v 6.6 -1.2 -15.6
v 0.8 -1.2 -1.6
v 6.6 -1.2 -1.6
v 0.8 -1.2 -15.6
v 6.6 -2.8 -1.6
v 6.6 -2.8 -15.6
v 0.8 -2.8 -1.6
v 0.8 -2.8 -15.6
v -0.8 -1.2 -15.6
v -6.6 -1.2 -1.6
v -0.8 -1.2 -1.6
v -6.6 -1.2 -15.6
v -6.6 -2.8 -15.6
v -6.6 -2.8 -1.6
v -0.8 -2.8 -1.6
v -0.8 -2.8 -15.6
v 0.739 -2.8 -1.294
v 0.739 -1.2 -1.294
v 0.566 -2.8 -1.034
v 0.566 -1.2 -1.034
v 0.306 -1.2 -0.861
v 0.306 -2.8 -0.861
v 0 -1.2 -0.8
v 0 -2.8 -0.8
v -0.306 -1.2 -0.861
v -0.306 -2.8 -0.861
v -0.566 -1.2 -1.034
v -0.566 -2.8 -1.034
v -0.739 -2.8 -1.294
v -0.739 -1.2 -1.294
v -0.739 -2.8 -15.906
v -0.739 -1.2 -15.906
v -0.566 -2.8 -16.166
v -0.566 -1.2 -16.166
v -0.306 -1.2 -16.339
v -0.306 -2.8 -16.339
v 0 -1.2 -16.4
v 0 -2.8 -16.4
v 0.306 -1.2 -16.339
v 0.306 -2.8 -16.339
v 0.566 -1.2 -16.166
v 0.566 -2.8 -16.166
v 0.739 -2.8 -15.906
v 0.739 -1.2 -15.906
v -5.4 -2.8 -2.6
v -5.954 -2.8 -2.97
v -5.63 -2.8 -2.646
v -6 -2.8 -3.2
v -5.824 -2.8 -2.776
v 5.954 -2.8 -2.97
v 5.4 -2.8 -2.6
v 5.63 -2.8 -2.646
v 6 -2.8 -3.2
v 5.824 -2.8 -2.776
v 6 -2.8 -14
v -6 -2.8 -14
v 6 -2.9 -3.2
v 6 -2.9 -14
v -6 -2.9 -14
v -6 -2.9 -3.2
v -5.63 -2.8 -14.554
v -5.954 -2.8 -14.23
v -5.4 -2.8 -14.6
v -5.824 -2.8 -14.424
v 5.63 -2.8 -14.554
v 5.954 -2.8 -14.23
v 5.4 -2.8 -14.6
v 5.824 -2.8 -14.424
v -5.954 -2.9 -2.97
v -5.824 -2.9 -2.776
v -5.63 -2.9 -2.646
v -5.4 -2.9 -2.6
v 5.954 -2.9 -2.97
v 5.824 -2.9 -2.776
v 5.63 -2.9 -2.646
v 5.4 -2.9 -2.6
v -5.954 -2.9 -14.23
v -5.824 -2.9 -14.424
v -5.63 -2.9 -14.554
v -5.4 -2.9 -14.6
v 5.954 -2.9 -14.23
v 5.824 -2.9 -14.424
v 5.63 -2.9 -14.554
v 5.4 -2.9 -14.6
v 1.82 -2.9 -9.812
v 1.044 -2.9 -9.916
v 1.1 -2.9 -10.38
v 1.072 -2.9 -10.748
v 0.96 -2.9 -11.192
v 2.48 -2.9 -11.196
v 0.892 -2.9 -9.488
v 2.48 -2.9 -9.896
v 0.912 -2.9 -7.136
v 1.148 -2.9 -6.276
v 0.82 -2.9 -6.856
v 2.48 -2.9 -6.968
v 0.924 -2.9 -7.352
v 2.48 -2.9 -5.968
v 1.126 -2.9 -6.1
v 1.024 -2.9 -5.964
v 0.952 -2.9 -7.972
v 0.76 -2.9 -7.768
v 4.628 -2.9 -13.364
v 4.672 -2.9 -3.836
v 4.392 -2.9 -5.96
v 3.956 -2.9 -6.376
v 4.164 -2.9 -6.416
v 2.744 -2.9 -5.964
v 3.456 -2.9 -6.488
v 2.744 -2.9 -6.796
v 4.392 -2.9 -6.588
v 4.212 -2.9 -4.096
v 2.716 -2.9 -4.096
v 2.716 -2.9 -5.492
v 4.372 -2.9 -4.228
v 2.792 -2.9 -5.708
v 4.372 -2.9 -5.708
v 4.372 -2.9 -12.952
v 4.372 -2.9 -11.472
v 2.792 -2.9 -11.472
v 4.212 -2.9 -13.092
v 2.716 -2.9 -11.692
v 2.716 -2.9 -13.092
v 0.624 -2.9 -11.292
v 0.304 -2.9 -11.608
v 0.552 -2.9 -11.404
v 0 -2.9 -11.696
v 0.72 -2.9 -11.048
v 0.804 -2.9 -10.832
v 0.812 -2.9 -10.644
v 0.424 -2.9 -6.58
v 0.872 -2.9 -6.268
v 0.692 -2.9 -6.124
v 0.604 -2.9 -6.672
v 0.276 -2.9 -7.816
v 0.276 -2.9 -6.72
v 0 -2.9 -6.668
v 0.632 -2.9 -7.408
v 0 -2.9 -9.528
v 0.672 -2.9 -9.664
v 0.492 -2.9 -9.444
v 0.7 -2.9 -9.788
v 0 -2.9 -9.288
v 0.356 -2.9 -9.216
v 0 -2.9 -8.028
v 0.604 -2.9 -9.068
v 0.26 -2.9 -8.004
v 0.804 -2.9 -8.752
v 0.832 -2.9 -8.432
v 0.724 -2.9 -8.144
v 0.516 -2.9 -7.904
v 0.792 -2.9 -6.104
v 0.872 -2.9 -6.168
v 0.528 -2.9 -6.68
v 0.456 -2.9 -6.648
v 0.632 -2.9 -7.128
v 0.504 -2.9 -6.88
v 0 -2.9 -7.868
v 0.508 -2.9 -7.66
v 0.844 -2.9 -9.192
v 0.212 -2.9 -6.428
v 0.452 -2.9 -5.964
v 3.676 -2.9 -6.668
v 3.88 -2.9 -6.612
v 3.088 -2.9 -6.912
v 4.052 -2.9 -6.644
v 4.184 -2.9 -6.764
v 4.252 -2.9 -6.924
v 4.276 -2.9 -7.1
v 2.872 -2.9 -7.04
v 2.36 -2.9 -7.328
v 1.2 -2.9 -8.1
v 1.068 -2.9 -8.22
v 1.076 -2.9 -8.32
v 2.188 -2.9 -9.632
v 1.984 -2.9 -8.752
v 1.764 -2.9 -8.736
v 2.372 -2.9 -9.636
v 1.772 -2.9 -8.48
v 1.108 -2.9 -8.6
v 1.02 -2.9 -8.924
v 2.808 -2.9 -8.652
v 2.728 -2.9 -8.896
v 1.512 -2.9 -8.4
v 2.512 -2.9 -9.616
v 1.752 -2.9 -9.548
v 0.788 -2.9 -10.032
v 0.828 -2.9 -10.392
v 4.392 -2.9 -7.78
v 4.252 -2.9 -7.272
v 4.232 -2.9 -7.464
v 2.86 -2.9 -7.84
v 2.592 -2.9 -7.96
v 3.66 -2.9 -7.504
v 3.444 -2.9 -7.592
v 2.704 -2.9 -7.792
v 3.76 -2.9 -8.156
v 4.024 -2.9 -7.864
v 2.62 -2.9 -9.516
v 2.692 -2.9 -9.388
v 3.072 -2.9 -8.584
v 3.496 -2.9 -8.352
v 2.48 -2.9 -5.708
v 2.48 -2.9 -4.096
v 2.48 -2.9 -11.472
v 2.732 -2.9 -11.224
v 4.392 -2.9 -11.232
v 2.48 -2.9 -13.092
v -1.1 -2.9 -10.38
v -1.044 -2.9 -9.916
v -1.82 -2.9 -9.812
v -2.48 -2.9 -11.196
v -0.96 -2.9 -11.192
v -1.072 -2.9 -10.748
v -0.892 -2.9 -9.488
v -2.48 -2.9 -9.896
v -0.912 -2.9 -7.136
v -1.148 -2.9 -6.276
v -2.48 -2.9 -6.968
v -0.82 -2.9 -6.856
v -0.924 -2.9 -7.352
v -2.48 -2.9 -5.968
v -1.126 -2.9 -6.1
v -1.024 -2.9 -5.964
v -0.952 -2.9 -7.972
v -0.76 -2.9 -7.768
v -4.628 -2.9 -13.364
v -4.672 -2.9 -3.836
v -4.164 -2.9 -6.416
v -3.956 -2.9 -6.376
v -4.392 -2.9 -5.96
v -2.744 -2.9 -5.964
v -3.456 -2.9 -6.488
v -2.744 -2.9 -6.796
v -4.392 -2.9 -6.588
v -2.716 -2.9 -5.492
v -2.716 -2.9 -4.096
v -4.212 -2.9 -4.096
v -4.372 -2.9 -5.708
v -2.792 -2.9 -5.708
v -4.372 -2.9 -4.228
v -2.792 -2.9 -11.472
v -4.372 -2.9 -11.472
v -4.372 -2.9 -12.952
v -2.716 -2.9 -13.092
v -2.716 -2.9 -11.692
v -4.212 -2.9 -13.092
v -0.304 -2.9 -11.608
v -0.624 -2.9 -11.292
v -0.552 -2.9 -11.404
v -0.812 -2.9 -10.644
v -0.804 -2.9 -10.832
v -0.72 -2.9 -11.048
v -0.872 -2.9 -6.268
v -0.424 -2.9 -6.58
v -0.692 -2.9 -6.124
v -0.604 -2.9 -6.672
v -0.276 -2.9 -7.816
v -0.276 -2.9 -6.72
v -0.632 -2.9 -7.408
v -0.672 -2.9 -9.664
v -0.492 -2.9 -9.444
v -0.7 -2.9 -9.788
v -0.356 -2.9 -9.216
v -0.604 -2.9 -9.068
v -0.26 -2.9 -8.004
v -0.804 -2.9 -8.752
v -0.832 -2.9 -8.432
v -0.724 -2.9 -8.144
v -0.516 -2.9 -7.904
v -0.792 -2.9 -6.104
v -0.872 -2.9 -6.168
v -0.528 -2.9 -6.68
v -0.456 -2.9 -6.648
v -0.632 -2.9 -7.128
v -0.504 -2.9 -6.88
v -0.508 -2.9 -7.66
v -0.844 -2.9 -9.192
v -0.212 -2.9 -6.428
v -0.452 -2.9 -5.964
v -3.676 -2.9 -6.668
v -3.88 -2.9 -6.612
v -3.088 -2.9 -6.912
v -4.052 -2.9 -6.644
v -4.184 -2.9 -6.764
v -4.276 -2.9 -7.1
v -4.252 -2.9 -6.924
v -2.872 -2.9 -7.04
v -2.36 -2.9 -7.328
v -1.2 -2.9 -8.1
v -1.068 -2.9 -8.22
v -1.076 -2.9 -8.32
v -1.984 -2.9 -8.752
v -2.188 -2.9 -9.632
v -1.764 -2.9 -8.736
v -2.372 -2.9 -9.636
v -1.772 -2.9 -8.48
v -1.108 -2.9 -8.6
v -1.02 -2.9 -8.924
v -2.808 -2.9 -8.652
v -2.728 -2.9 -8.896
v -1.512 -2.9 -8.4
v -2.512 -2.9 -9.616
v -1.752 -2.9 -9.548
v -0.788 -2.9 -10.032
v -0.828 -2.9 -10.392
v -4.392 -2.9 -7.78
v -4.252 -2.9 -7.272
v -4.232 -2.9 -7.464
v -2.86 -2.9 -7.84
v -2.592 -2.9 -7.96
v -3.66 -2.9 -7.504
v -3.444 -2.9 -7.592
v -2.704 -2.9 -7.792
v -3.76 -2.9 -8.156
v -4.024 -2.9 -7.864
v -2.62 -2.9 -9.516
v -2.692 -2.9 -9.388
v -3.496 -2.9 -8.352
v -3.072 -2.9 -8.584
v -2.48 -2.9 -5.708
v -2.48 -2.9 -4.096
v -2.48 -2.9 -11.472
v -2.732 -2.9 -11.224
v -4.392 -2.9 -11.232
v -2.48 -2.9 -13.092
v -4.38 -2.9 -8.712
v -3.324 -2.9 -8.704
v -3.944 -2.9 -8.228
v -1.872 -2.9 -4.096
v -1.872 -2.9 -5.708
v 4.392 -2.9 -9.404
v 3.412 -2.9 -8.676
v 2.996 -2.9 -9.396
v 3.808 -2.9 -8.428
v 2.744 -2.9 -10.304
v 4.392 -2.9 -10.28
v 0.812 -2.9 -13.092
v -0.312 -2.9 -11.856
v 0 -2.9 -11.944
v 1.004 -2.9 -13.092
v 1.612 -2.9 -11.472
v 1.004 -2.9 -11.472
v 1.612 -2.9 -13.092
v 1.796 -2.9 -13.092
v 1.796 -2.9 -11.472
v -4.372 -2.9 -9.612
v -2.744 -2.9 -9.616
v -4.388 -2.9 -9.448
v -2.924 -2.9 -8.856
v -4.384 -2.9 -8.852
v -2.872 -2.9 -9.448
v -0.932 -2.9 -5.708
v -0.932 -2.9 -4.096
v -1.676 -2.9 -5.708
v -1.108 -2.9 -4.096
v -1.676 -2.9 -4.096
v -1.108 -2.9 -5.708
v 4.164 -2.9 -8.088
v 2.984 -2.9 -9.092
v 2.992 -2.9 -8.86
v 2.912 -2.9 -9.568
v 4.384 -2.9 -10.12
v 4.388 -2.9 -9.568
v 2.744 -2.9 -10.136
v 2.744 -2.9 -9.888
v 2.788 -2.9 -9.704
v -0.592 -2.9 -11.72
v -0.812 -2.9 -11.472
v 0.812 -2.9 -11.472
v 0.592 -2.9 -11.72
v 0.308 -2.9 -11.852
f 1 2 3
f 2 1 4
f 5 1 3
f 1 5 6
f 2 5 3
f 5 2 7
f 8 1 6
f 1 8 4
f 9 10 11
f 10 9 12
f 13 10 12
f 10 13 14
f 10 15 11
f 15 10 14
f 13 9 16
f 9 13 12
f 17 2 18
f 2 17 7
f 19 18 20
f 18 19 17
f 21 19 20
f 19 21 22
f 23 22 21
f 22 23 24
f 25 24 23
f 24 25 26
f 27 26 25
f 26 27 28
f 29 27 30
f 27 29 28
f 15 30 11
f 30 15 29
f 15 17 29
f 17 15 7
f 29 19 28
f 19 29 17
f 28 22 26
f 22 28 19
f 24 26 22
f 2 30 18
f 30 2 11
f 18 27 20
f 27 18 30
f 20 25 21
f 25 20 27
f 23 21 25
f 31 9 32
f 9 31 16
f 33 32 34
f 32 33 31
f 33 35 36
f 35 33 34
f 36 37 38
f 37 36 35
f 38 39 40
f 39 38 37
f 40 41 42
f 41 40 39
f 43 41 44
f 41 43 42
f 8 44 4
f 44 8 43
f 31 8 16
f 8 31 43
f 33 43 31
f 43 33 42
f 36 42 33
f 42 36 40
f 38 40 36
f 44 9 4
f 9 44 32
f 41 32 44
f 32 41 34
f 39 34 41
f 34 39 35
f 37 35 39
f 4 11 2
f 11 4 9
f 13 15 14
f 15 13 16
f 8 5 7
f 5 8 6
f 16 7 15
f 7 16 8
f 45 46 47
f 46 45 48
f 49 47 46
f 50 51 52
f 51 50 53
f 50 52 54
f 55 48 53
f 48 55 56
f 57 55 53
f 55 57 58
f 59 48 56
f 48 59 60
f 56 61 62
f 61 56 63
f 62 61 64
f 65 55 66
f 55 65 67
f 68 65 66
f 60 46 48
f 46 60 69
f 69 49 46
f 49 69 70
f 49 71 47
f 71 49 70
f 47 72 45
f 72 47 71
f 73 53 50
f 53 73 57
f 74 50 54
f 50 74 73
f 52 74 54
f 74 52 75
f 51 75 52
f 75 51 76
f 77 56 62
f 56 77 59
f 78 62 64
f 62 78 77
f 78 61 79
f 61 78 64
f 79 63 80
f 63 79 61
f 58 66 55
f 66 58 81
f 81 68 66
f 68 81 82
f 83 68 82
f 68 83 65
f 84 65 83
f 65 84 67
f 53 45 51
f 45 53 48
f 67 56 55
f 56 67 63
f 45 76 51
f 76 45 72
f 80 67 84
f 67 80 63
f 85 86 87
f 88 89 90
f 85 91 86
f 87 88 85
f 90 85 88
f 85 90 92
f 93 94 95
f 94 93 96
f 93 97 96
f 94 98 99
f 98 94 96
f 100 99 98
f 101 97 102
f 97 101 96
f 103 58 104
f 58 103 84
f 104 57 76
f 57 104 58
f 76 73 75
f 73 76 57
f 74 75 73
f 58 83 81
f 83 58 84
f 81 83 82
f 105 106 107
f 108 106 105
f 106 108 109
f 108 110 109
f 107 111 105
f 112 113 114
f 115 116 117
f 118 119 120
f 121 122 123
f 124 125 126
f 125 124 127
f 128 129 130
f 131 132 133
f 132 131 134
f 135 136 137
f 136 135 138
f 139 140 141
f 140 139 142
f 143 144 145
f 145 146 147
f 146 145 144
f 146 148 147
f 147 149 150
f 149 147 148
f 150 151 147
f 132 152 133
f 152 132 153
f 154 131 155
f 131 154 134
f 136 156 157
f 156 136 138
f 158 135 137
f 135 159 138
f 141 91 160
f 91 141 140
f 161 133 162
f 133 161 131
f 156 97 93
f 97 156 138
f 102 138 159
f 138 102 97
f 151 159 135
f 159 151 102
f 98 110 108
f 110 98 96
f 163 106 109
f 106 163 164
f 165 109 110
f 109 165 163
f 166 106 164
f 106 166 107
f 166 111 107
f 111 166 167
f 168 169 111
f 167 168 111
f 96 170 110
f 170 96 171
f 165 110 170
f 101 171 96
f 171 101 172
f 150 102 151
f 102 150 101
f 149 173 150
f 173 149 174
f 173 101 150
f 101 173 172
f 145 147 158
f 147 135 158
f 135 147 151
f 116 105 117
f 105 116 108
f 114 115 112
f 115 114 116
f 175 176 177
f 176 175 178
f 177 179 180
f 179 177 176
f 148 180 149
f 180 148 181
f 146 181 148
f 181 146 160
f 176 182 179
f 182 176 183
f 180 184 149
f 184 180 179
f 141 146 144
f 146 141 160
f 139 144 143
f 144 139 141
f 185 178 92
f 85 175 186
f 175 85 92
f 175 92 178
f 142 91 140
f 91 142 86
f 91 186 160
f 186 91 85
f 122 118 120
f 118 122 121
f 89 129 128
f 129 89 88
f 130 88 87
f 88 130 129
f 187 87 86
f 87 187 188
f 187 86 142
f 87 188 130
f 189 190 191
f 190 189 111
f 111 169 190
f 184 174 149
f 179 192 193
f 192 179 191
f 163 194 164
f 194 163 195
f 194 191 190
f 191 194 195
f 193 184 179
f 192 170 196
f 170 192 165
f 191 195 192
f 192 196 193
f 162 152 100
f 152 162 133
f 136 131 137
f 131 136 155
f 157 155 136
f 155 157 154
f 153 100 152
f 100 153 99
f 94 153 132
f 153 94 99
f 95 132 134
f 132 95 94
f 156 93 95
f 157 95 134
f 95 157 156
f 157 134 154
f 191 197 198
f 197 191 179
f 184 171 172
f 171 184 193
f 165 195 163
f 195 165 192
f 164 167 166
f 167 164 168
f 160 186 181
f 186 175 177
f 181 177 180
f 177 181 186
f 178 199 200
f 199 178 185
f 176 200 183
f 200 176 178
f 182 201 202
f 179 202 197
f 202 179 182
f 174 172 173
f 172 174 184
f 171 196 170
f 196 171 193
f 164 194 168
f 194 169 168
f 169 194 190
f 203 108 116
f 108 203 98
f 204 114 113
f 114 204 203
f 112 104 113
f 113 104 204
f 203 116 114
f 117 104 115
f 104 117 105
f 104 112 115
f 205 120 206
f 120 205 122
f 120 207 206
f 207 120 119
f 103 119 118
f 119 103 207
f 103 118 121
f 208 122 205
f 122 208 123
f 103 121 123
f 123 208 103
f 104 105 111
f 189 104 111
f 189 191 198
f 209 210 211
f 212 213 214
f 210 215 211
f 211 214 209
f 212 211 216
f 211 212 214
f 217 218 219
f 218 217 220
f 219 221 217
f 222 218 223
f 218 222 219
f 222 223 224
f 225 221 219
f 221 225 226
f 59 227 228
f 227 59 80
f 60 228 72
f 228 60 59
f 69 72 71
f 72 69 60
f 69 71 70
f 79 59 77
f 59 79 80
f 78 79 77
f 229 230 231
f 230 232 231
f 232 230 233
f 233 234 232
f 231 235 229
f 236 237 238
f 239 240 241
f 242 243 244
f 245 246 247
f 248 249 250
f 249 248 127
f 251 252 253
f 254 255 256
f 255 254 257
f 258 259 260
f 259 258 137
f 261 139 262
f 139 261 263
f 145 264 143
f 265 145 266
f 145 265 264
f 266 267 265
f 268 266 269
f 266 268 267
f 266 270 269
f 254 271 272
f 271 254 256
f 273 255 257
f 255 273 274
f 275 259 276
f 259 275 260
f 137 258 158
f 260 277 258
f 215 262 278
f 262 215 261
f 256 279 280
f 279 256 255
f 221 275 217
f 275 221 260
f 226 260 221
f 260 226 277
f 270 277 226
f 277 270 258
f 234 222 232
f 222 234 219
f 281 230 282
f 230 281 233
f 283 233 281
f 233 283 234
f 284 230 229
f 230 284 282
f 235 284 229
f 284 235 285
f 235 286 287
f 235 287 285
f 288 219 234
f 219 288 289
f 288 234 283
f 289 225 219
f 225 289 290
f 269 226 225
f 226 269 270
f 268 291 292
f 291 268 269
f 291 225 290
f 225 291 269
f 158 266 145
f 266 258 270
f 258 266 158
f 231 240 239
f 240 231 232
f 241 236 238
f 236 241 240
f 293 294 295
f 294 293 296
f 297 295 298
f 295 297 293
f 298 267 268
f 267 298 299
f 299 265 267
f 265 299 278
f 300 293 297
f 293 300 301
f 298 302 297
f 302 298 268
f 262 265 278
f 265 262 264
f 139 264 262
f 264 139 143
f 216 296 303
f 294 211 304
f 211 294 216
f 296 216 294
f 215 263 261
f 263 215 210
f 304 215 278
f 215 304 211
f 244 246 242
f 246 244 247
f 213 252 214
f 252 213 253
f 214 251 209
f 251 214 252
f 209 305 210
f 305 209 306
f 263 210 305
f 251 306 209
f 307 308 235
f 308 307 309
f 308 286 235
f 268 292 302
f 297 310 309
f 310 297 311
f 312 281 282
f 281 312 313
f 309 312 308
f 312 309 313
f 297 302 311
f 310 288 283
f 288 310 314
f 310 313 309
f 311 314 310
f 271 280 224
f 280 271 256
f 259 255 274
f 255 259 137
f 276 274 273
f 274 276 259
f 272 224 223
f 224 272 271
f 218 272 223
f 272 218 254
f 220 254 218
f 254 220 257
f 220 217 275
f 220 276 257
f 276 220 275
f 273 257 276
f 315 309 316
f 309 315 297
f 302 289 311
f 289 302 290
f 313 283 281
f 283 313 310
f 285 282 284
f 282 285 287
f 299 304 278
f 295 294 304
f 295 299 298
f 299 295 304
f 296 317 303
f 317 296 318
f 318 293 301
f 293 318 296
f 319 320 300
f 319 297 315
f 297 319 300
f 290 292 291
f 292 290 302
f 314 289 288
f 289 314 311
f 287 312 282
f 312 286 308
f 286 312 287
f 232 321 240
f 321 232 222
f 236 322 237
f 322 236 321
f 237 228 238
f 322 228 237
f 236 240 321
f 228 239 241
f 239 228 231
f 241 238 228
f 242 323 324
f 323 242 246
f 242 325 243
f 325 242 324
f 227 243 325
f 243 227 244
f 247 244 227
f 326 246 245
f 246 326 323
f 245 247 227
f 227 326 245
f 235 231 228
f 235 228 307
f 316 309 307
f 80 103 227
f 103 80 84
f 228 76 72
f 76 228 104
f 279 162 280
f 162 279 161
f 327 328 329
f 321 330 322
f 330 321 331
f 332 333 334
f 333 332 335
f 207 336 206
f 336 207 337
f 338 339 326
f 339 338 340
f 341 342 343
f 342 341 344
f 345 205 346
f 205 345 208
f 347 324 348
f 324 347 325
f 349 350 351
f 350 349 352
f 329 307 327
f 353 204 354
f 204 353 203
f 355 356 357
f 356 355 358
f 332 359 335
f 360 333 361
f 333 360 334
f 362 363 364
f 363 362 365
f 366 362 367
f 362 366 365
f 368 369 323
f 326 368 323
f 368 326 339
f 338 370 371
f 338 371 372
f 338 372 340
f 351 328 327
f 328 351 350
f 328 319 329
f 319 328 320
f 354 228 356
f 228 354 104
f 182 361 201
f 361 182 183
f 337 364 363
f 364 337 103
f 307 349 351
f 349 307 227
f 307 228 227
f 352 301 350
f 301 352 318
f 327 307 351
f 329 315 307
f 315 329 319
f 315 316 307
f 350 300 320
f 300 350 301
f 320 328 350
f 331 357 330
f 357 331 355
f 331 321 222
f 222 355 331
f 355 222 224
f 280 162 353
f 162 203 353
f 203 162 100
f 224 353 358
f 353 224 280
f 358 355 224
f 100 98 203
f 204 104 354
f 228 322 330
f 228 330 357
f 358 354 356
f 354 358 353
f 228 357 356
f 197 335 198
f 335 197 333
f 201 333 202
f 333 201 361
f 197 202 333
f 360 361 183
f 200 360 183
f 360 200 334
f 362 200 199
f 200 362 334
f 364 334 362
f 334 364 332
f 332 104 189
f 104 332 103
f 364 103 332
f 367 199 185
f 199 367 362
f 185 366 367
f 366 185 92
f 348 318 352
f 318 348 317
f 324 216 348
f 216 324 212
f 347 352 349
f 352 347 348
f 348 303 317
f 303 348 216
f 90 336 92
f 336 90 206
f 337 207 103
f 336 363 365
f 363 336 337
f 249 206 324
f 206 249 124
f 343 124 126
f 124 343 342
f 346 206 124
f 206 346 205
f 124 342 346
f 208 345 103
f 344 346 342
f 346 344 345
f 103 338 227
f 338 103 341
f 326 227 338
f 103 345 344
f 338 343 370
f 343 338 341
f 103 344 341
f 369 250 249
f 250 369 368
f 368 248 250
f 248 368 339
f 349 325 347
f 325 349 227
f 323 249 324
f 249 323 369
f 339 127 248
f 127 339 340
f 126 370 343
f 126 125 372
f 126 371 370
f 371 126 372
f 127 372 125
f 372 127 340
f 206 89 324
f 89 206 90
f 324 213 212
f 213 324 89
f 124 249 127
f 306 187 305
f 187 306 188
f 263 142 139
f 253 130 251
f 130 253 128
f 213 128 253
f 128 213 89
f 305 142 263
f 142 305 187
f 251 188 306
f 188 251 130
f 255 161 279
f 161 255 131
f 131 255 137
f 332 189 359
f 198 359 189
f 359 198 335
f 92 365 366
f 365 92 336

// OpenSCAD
use <../lib.scad>
use <60601.scad>
use <6522835a.scad>
function ldraw_lib__60601d08() = [
// 0 Glass for Window  1 x  2 x  2 with Stained Glass Bee Sticker
// 0 Name: 60601d08.dat
// 0 Author: Philippe Hurbain [Philo]
// 0 !LDRAW_ORG Shortcut UPDATE 2025-11
// 0 !LICENSE Licensed under CC BY 4.0 : see CAreadme.txt
// 
// 0 BFC CERTIFY CCW
  [0,"BFC","CERTIFY"],
  [0,"BFC","CCW"],
// 
// 0 !CATEGORY Sticker Shortcut
// 
// 0 !KEYWORDS Beekeepers' House and Flower Garden, BrickLink 42669stk02, Friends
// 0 !KEYWORDS Rebrickable 10110732, Set 42669
// 
// 0 !HISTORY 2025-11-30 [OrionP] Official Update 2025-11
// 
// 1 16 0 0 0 1 0 0 0 1 0 0 0 1 60601.dat
  [1,16,0,0,0,1,0,0,0,1,0,0,0,1, ldraw_lib__60601()],
// 1 16 0 21.5 -7 1 0 0 0 0 -1 0 1 0 6522835a.dat
  [1,16,0,21.5,-7,1,0,0,0,0,-1,0,1,0, ldraw_lib__6522835a()],
];
module ldraw_lib__60601d08(step=0, col=false, unit=2/5, alt=false, line=0.2, solid=!$preview)
    makepoly(ldraw_lib__60601d08(), step=step, col=col, unit=unit, alt=alt, line=line, solid=solid);
ldraw_lib__60601d08(line=0.2);
